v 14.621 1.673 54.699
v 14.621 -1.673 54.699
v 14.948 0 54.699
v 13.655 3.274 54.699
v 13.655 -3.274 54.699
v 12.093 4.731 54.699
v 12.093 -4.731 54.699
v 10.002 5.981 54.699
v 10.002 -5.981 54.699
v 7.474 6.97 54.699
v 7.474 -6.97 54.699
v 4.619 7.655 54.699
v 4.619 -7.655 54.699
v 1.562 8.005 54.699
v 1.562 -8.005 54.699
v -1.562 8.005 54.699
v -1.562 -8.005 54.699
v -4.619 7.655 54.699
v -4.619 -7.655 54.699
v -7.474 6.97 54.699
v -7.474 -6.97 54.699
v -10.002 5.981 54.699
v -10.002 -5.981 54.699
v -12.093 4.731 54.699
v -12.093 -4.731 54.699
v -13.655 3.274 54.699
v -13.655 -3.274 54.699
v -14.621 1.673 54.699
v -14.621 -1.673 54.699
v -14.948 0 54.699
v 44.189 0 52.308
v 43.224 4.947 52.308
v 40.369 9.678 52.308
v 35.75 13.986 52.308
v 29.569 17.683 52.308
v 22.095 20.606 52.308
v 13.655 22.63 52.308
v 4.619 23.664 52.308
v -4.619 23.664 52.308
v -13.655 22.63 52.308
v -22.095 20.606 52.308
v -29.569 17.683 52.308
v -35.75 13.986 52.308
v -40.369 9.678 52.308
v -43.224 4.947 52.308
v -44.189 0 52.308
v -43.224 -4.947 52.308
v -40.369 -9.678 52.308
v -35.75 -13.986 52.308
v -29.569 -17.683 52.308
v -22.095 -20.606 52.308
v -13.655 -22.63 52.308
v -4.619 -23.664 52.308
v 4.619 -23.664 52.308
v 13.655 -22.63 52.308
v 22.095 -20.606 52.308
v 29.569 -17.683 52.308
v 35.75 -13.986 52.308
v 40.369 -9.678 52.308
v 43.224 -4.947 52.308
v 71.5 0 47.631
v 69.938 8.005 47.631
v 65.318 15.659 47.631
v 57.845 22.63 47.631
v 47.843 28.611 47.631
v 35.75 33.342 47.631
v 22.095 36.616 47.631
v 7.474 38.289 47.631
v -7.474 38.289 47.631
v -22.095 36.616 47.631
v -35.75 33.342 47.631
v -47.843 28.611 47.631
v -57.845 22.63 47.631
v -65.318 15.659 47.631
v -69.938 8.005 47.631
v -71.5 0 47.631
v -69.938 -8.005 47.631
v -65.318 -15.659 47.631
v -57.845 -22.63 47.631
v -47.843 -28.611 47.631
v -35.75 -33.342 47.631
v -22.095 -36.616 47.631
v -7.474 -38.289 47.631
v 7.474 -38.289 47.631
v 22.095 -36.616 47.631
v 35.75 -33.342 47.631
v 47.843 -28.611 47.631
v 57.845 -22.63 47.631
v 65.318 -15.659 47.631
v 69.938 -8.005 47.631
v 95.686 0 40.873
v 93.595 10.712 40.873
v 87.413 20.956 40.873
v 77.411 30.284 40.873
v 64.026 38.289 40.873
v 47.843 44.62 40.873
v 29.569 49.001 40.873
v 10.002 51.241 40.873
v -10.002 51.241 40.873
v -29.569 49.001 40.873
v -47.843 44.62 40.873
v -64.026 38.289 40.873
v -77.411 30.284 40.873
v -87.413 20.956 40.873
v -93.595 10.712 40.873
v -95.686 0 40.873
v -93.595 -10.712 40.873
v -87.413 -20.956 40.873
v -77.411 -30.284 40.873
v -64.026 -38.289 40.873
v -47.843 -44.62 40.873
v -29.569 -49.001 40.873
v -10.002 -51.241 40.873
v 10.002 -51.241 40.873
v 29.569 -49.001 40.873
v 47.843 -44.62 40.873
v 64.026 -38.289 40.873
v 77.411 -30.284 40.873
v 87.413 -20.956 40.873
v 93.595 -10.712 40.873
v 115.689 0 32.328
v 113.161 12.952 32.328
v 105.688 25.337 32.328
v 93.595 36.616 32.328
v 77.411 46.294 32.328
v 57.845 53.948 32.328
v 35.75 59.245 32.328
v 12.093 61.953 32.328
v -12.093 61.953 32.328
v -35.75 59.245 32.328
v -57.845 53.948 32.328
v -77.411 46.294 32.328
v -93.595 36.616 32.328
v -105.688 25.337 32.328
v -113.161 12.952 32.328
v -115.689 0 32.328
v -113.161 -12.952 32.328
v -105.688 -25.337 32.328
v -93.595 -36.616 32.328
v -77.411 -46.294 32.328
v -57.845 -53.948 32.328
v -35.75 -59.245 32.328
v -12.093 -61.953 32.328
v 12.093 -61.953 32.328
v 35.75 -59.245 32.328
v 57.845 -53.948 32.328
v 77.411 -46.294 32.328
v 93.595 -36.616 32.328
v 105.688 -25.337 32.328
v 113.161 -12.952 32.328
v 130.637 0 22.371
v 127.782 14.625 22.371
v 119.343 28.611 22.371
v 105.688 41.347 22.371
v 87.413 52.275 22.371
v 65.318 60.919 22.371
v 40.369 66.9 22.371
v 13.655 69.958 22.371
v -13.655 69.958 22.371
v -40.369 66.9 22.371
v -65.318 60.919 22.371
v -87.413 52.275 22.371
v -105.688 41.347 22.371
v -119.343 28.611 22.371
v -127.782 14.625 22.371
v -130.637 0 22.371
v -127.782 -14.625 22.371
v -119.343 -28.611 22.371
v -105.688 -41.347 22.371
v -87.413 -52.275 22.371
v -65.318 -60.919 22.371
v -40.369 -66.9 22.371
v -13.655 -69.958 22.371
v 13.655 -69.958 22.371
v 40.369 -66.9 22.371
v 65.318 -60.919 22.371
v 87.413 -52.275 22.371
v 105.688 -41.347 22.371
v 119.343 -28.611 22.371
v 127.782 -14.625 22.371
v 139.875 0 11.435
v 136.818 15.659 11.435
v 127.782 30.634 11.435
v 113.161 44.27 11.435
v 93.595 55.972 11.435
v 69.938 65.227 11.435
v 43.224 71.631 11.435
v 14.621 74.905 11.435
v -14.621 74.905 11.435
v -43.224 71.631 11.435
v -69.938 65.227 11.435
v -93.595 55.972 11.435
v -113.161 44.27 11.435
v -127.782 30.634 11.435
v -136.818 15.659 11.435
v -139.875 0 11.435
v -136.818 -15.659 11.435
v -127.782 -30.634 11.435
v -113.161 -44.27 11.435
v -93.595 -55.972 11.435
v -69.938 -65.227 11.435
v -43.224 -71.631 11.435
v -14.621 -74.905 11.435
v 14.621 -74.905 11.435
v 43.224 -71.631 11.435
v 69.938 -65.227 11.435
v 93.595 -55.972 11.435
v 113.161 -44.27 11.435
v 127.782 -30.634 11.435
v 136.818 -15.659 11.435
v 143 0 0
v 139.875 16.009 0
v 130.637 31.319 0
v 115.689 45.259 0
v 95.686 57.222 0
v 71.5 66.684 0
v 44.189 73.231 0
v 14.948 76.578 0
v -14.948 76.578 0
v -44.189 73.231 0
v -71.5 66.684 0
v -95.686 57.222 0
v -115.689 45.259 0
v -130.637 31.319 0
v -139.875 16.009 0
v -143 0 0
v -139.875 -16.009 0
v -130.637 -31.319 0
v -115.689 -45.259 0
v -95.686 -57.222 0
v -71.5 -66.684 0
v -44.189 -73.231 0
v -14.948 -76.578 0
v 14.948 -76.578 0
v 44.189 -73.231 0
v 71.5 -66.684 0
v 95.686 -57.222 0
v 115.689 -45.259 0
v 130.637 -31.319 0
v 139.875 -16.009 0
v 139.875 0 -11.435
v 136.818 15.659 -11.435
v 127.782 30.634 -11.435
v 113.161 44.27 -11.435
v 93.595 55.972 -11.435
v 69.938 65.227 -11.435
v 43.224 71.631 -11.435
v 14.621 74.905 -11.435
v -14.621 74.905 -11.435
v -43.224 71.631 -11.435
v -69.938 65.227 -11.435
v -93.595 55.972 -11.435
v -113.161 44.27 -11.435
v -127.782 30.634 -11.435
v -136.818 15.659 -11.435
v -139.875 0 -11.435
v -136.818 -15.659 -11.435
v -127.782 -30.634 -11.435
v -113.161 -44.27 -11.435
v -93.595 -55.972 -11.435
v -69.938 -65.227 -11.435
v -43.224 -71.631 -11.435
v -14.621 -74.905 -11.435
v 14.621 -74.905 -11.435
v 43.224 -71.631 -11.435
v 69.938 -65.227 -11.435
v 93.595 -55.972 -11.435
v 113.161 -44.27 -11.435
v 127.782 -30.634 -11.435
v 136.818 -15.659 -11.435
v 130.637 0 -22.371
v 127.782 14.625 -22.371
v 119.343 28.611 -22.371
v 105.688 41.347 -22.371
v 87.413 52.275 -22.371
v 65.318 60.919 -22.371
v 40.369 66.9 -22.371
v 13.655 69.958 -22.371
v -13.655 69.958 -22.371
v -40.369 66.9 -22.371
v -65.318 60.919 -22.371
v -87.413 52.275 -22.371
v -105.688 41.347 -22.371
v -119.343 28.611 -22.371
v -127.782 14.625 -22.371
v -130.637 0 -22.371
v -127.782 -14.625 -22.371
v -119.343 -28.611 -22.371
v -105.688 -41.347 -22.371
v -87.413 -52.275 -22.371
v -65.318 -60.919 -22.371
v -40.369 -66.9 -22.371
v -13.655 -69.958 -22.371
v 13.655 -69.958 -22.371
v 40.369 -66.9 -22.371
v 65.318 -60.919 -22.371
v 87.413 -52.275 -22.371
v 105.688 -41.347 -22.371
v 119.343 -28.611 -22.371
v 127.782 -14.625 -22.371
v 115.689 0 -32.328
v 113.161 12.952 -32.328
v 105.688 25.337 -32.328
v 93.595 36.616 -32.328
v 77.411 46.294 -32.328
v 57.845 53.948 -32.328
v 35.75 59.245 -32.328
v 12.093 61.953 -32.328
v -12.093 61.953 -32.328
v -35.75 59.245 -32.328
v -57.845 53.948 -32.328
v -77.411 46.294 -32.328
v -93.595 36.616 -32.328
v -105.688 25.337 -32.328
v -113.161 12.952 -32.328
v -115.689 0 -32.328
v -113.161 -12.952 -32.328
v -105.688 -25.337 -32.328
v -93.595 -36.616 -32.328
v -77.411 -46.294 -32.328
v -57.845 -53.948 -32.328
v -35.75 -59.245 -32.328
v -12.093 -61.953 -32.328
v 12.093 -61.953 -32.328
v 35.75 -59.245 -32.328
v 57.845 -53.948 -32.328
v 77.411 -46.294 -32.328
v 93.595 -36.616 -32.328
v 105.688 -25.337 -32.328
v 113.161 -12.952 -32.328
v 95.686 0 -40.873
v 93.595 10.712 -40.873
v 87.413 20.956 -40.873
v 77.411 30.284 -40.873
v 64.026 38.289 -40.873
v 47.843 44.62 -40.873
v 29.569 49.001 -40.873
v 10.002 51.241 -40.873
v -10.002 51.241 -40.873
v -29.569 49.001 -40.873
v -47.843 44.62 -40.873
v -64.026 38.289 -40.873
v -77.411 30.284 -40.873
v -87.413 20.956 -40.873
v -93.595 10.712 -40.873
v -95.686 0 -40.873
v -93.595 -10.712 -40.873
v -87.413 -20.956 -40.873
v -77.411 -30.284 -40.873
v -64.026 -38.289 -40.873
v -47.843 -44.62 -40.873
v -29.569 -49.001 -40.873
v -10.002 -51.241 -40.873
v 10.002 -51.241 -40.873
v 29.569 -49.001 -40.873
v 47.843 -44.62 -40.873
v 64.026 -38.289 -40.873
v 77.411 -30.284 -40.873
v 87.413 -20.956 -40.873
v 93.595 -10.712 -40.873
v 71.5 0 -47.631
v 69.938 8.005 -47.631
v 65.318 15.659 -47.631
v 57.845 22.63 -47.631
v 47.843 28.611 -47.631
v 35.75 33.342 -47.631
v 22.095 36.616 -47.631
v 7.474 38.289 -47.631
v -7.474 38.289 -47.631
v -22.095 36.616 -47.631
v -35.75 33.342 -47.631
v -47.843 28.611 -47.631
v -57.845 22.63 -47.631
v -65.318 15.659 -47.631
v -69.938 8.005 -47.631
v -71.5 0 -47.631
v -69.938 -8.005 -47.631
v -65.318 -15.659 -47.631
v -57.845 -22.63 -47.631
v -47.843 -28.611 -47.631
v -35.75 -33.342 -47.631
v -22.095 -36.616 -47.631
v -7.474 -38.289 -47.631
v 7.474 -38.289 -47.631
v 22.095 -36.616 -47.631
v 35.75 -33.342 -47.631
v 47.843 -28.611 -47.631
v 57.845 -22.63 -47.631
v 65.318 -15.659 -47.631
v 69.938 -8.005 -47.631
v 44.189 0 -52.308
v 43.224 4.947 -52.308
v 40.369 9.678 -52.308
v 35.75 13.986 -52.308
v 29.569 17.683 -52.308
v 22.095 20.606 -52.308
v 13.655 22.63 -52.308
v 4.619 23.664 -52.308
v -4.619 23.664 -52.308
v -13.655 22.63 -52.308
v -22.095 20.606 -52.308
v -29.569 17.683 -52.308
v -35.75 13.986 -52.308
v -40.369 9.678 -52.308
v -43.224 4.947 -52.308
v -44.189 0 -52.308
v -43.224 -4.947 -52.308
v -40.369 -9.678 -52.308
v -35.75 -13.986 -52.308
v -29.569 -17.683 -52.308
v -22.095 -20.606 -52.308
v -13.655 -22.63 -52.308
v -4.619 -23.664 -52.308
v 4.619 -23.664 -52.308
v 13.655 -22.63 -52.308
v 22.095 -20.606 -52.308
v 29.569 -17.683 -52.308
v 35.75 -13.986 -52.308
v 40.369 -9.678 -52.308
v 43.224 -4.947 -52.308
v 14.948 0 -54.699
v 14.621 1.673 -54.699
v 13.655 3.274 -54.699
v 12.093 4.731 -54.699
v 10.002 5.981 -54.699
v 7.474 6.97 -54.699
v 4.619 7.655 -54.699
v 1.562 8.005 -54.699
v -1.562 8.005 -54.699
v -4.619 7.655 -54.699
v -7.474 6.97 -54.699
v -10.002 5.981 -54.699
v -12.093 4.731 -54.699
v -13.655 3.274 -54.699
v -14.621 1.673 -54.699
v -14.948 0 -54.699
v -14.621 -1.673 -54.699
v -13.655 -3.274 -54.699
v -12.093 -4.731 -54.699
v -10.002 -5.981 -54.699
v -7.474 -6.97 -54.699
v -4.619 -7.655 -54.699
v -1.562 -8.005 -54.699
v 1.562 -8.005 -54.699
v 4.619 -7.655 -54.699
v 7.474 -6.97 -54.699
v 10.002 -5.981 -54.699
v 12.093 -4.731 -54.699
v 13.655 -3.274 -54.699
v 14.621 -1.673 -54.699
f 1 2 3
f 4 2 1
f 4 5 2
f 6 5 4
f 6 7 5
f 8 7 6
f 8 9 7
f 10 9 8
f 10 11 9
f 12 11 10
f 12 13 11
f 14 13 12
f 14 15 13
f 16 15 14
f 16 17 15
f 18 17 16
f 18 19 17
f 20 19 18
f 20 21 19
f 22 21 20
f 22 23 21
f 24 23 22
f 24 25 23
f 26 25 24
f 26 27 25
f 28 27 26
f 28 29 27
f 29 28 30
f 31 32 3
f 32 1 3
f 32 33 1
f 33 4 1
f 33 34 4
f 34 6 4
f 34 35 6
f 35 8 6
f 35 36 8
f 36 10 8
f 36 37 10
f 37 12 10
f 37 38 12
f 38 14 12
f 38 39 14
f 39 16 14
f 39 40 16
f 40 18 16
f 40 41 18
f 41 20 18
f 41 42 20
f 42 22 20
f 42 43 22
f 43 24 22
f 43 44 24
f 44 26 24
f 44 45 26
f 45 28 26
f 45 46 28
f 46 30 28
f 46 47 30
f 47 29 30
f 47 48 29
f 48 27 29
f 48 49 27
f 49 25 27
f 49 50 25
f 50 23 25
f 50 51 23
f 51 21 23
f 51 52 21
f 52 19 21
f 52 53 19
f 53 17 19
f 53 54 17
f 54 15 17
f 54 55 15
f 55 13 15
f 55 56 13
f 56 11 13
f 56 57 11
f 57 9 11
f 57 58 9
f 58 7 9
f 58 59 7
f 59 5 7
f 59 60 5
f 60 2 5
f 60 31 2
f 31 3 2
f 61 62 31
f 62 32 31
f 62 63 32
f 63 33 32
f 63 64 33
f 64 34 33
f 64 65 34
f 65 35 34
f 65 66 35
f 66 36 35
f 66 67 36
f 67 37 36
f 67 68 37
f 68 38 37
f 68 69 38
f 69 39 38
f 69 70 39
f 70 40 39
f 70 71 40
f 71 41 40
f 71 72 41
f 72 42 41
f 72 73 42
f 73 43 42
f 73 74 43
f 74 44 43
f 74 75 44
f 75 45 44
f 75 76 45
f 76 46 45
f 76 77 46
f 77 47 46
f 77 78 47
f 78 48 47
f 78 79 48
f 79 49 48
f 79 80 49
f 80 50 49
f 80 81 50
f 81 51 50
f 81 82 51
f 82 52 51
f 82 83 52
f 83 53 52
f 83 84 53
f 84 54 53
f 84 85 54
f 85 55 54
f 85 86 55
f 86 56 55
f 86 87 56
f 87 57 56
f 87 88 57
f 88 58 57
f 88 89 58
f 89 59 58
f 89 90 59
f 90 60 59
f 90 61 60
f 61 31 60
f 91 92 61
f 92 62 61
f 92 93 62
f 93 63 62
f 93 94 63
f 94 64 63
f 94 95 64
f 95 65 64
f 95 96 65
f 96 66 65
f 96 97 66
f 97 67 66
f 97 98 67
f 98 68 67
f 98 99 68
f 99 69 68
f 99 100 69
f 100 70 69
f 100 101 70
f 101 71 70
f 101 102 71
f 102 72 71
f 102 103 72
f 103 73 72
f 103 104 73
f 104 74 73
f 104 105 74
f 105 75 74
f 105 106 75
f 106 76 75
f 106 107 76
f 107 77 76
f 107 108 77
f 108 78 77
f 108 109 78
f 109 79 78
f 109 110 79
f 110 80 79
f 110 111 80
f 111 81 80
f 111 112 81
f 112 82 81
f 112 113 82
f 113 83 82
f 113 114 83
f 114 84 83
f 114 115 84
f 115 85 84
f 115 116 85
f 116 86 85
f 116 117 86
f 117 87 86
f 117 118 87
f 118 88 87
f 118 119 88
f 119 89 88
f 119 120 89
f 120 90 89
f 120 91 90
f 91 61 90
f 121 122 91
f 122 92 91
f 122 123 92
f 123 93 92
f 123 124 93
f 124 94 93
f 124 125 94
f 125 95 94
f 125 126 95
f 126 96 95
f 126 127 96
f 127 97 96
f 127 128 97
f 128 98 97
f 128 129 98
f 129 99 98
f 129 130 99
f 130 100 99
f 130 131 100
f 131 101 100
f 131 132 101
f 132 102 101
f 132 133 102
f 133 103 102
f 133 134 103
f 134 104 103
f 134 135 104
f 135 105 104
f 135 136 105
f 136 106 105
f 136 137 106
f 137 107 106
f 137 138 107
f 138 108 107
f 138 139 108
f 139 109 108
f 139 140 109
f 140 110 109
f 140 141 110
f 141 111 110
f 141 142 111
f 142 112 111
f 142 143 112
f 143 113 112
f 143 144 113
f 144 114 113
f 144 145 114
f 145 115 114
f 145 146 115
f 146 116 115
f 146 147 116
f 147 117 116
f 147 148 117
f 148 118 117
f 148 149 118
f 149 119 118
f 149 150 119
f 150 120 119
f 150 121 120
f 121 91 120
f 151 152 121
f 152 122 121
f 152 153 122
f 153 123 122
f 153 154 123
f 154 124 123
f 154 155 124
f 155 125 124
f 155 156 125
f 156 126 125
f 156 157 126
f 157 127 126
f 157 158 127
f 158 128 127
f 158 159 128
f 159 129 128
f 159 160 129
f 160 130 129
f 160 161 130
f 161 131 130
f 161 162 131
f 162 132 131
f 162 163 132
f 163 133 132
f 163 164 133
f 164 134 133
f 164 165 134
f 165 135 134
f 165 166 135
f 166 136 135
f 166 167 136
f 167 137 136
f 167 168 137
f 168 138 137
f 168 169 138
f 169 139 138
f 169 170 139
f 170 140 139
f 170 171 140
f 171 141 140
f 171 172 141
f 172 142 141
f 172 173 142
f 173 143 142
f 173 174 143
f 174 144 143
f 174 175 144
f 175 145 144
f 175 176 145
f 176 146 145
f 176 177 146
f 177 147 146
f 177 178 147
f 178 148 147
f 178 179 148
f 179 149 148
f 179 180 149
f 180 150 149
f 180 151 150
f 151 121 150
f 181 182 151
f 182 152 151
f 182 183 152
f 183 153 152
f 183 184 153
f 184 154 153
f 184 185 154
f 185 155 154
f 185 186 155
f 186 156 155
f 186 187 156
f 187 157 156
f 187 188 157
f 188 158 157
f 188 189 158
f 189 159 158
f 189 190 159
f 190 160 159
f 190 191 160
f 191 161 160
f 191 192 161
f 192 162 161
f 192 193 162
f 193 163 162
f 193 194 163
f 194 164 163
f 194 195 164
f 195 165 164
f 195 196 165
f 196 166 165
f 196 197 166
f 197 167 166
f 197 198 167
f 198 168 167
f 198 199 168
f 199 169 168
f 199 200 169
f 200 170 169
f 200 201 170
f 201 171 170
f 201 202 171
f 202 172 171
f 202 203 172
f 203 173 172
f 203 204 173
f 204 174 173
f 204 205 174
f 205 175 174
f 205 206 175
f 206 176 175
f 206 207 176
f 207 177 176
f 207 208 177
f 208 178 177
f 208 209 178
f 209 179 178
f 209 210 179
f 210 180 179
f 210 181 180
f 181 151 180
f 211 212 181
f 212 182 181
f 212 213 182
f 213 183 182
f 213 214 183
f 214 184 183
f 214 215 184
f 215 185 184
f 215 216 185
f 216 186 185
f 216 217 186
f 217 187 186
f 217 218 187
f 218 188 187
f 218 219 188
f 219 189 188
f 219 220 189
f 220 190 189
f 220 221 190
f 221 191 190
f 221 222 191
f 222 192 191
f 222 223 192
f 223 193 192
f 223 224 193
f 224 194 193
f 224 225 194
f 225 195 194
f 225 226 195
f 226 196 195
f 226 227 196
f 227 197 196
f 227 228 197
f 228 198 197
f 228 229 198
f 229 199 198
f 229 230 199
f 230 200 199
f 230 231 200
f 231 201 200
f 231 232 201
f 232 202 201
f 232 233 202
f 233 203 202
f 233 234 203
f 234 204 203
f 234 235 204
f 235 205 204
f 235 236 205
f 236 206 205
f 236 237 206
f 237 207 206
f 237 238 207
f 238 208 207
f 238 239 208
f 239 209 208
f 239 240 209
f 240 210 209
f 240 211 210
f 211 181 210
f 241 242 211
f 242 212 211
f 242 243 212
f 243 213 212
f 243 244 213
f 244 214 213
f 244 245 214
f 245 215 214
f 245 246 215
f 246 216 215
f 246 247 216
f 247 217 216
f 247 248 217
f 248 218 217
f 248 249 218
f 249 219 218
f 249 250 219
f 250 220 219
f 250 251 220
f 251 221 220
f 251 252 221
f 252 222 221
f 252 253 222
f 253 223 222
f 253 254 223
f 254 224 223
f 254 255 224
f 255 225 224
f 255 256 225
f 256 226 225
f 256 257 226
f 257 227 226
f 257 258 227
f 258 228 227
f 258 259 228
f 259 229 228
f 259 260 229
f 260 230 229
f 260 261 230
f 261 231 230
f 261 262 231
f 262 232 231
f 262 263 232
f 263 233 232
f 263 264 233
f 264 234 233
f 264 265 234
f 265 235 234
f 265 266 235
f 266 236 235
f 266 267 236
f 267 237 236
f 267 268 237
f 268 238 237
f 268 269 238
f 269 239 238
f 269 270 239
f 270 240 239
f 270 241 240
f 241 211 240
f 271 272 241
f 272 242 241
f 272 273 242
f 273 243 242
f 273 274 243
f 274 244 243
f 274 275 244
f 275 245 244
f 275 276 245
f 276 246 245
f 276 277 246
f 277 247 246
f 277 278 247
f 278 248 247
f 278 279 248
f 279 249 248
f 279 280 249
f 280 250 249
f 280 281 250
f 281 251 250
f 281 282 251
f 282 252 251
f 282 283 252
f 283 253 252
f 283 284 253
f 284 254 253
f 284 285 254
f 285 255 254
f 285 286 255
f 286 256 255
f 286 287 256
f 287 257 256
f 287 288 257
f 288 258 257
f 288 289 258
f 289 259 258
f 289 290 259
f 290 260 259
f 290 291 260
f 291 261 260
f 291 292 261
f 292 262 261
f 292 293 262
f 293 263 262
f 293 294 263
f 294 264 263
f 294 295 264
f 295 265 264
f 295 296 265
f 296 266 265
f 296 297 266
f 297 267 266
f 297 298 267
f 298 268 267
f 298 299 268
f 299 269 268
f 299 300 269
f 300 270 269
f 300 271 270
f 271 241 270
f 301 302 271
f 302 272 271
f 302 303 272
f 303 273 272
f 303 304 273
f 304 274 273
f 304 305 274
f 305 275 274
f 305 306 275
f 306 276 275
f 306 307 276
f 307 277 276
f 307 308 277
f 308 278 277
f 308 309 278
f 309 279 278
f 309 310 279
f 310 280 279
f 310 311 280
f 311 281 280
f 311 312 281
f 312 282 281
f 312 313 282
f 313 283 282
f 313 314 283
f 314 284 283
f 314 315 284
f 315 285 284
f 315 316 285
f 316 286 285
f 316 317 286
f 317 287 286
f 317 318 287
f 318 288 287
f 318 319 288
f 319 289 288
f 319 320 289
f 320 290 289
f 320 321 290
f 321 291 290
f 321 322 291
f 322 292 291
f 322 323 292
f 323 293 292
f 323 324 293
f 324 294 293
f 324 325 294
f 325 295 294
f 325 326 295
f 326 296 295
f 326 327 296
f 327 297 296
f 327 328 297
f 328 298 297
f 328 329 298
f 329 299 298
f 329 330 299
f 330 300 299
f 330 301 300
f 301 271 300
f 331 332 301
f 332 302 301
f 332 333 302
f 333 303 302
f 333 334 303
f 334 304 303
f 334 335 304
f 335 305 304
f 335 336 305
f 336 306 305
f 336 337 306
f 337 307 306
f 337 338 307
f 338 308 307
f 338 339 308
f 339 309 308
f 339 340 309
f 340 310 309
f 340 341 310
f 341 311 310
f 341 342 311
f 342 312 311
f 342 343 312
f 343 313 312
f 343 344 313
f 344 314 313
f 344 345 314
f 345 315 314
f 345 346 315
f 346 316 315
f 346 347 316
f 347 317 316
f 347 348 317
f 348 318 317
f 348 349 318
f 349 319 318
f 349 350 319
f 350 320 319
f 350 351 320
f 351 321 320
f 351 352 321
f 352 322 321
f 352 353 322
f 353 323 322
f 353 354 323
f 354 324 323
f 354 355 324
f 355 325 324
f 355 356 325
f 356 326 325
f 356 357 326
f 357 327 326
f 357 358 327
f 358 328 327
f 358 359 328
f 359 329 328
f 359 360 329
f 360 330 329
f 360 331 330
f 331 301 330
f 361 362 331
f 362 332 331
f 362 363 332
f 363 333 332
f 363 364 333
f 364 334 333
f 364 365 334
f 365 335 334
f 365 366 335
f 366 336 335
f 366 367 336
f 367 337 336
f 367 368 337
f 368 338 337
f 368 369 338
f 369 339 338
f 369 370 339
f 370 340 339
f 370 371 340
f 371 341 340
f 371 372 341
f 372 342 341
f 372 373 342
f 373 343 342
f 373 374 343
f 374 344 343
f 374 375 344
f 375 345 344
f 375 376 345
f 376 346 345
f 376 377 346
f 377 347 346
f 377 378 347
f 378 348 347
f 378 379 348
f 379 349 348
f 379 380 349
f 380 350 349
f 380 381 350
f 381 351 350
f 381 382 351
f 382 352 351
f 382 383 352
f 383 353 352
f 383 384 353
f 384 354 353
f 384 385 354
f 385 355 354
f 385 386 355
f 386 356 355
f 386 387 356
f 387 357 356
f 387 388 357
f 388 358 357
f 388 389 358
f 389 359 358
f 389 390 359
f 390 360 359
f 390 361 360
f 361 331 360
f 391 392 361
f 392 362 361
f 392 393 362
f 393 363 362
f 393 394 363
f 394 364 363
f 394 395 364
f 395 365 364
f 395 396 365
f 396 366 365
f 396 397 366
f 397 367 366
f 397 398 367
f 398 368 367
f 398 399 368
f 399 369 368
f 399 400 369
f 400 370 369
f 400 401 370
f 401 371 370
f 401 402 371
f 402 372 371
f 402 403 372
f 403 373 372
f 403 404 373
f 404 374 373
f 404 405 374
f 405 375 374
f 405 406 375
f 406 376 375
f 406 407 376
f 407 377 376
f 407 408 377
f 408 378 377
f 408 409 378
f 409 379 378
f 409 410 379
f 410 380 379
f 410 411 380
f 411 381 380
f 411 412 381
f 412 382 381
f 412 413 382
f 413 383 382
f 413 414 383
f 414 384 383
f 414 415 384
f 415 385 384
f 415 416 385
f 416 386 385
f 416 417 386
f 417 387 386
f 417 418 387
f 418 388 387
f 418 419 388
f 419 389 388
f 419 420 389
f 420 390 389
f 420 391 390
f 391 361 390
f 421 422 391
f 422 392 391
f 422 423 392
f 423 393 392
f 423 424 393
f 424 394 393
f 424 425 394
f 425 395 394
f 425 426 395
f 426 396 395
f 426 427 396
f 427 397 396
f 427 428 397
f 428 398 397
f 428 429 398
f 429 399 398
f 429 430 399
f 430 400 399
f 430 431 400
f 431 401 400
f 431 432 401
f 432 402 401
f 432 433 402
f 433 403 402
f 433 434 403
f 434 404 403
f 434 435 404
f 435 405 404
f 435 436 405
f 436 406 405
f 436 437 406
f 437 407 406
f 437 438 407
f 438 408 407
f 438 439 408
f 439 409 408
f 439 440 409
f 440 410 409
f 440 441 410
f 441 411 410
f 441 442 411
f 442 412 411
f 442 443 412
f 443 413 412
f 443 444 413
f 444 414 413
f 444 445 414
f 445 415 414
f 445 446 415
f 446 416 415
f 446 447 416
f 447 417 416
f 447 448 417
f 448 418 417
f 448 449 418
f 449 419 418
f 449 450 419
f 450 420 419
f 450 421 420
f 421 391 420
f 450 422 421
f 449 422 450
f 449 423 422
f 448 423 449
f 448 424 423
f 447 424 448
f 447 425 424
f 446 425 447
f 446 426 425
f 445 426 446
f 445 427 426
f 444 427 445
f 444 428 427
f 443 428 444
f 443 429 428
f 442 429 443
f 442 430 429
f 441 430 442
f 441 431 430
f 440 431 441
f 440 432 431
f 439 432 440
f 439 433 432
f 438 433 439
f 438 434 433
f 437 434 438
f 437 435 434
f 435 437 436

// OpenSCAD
// Generated by SolidPython 1.0.1 on 2020-07-29 00:46:50


scale(v = [13, 7, 5]) {
	sphere(r = 11);
}
/***********************************************
*********      SolidPython code:      **********
************************************************
 
# import packages: SolidPython
from solid import *
from solid.utils import *
from itertools import chain, combinations, permutations


class Resize:

    def __init__(self, scad_file):
        self.scad_file = scad_file
        #self.scad_file = import_scad(scad_file)
        # cone/cylinder param:
        self.r1 = 0
        self.r2 = 0
        self.h = 0
        # rectangular prism param:
        self.w = 0
        self.l = 0
        # ellipse param:
        self.r = 0

    # import OpenScad code (file name corresponds to shape)


    # classify shape + parameters
    def assign(self, param1, param2, param3):
        if self.scad_file == 'cone.scad':
            self.r1 = param1
            self.r2 = param2
            self.h = param3
        elif self.scad_file == 'cylinder.scad':
            self.r1 = param1
            self.r2 = param2
            self.h = param3
        elif self.scad_file == 'rectangularPrism.scad':
            self.h = param1
            self.l = param2
            self.w = param3
        else:
            self.r = param1
            self.h = param2

    # resize parameters
    def iterate(self):
        x = range(3, 20, 2)
        i = 1
        if self.scad_file == 'cone.scad':
            tempList = list(permutations(x, 2))
            for temp in tempList:
                param1 = temp[0]
                param2 = temp[1]
                filepath = 'produced_scad_files/' + 'cone' + str(param1) + '_' + str(param2) + '_' + '.scad'
                scad_render_to_file(cylinder(h=param1, r1=param2, r2=0), filepath)

        elif self.scad_file == 'cylinder.scad':
            tempList = list(permutations(x, 3))
            for temp in tempList:
                param1 = temp[0]
                param2 = temp[1]
                filepath = 'produced_scad_files/' + 'cylinder' + str(param1) + '_' + str(param2) + '_' + '.scad'
                scad_render_to_file(cylinder(h=param1, r1=param2, r2=param2), filepath)

        elif self.scad_file == 'rectangularPrism.scad':
            tempList = list(permutations(x, 3))
            for temp in tempList:
                param1 = temp[0]
                param2 = temp[1]
                param3 = temp[2]
                filepath = 'produced_scad_files/' + 'rectangularPrism' + str(param1) + '_' + str(param2) + '_' + str(
                    param3) + '.scad'
                scad_render_to_file(cube(size=(param1, param2, param3)), filepath)

        elif self.scad_file == 'ellipse.scad':
            tempList = list(permutations(x, 4))
            for temp in tempList:
                param1 = temp[0]
                param2 = temp[1]
                param3 = temp[2]
                param4 = temp[3]
                filepath = 'produced_scad_files/' + 'ellipse' + str(param1) + '_' + str(param2) + '_' + str(param3) + '_' + str(param4) + '.scad'
                scad_render_to_file(scale([param1, param2, param3])(sphere(r=param4)), filepath)

    def render_to_scadfile(self):
        scad_render_to_file(scad, 'example.scad') 
 
************************************************/
